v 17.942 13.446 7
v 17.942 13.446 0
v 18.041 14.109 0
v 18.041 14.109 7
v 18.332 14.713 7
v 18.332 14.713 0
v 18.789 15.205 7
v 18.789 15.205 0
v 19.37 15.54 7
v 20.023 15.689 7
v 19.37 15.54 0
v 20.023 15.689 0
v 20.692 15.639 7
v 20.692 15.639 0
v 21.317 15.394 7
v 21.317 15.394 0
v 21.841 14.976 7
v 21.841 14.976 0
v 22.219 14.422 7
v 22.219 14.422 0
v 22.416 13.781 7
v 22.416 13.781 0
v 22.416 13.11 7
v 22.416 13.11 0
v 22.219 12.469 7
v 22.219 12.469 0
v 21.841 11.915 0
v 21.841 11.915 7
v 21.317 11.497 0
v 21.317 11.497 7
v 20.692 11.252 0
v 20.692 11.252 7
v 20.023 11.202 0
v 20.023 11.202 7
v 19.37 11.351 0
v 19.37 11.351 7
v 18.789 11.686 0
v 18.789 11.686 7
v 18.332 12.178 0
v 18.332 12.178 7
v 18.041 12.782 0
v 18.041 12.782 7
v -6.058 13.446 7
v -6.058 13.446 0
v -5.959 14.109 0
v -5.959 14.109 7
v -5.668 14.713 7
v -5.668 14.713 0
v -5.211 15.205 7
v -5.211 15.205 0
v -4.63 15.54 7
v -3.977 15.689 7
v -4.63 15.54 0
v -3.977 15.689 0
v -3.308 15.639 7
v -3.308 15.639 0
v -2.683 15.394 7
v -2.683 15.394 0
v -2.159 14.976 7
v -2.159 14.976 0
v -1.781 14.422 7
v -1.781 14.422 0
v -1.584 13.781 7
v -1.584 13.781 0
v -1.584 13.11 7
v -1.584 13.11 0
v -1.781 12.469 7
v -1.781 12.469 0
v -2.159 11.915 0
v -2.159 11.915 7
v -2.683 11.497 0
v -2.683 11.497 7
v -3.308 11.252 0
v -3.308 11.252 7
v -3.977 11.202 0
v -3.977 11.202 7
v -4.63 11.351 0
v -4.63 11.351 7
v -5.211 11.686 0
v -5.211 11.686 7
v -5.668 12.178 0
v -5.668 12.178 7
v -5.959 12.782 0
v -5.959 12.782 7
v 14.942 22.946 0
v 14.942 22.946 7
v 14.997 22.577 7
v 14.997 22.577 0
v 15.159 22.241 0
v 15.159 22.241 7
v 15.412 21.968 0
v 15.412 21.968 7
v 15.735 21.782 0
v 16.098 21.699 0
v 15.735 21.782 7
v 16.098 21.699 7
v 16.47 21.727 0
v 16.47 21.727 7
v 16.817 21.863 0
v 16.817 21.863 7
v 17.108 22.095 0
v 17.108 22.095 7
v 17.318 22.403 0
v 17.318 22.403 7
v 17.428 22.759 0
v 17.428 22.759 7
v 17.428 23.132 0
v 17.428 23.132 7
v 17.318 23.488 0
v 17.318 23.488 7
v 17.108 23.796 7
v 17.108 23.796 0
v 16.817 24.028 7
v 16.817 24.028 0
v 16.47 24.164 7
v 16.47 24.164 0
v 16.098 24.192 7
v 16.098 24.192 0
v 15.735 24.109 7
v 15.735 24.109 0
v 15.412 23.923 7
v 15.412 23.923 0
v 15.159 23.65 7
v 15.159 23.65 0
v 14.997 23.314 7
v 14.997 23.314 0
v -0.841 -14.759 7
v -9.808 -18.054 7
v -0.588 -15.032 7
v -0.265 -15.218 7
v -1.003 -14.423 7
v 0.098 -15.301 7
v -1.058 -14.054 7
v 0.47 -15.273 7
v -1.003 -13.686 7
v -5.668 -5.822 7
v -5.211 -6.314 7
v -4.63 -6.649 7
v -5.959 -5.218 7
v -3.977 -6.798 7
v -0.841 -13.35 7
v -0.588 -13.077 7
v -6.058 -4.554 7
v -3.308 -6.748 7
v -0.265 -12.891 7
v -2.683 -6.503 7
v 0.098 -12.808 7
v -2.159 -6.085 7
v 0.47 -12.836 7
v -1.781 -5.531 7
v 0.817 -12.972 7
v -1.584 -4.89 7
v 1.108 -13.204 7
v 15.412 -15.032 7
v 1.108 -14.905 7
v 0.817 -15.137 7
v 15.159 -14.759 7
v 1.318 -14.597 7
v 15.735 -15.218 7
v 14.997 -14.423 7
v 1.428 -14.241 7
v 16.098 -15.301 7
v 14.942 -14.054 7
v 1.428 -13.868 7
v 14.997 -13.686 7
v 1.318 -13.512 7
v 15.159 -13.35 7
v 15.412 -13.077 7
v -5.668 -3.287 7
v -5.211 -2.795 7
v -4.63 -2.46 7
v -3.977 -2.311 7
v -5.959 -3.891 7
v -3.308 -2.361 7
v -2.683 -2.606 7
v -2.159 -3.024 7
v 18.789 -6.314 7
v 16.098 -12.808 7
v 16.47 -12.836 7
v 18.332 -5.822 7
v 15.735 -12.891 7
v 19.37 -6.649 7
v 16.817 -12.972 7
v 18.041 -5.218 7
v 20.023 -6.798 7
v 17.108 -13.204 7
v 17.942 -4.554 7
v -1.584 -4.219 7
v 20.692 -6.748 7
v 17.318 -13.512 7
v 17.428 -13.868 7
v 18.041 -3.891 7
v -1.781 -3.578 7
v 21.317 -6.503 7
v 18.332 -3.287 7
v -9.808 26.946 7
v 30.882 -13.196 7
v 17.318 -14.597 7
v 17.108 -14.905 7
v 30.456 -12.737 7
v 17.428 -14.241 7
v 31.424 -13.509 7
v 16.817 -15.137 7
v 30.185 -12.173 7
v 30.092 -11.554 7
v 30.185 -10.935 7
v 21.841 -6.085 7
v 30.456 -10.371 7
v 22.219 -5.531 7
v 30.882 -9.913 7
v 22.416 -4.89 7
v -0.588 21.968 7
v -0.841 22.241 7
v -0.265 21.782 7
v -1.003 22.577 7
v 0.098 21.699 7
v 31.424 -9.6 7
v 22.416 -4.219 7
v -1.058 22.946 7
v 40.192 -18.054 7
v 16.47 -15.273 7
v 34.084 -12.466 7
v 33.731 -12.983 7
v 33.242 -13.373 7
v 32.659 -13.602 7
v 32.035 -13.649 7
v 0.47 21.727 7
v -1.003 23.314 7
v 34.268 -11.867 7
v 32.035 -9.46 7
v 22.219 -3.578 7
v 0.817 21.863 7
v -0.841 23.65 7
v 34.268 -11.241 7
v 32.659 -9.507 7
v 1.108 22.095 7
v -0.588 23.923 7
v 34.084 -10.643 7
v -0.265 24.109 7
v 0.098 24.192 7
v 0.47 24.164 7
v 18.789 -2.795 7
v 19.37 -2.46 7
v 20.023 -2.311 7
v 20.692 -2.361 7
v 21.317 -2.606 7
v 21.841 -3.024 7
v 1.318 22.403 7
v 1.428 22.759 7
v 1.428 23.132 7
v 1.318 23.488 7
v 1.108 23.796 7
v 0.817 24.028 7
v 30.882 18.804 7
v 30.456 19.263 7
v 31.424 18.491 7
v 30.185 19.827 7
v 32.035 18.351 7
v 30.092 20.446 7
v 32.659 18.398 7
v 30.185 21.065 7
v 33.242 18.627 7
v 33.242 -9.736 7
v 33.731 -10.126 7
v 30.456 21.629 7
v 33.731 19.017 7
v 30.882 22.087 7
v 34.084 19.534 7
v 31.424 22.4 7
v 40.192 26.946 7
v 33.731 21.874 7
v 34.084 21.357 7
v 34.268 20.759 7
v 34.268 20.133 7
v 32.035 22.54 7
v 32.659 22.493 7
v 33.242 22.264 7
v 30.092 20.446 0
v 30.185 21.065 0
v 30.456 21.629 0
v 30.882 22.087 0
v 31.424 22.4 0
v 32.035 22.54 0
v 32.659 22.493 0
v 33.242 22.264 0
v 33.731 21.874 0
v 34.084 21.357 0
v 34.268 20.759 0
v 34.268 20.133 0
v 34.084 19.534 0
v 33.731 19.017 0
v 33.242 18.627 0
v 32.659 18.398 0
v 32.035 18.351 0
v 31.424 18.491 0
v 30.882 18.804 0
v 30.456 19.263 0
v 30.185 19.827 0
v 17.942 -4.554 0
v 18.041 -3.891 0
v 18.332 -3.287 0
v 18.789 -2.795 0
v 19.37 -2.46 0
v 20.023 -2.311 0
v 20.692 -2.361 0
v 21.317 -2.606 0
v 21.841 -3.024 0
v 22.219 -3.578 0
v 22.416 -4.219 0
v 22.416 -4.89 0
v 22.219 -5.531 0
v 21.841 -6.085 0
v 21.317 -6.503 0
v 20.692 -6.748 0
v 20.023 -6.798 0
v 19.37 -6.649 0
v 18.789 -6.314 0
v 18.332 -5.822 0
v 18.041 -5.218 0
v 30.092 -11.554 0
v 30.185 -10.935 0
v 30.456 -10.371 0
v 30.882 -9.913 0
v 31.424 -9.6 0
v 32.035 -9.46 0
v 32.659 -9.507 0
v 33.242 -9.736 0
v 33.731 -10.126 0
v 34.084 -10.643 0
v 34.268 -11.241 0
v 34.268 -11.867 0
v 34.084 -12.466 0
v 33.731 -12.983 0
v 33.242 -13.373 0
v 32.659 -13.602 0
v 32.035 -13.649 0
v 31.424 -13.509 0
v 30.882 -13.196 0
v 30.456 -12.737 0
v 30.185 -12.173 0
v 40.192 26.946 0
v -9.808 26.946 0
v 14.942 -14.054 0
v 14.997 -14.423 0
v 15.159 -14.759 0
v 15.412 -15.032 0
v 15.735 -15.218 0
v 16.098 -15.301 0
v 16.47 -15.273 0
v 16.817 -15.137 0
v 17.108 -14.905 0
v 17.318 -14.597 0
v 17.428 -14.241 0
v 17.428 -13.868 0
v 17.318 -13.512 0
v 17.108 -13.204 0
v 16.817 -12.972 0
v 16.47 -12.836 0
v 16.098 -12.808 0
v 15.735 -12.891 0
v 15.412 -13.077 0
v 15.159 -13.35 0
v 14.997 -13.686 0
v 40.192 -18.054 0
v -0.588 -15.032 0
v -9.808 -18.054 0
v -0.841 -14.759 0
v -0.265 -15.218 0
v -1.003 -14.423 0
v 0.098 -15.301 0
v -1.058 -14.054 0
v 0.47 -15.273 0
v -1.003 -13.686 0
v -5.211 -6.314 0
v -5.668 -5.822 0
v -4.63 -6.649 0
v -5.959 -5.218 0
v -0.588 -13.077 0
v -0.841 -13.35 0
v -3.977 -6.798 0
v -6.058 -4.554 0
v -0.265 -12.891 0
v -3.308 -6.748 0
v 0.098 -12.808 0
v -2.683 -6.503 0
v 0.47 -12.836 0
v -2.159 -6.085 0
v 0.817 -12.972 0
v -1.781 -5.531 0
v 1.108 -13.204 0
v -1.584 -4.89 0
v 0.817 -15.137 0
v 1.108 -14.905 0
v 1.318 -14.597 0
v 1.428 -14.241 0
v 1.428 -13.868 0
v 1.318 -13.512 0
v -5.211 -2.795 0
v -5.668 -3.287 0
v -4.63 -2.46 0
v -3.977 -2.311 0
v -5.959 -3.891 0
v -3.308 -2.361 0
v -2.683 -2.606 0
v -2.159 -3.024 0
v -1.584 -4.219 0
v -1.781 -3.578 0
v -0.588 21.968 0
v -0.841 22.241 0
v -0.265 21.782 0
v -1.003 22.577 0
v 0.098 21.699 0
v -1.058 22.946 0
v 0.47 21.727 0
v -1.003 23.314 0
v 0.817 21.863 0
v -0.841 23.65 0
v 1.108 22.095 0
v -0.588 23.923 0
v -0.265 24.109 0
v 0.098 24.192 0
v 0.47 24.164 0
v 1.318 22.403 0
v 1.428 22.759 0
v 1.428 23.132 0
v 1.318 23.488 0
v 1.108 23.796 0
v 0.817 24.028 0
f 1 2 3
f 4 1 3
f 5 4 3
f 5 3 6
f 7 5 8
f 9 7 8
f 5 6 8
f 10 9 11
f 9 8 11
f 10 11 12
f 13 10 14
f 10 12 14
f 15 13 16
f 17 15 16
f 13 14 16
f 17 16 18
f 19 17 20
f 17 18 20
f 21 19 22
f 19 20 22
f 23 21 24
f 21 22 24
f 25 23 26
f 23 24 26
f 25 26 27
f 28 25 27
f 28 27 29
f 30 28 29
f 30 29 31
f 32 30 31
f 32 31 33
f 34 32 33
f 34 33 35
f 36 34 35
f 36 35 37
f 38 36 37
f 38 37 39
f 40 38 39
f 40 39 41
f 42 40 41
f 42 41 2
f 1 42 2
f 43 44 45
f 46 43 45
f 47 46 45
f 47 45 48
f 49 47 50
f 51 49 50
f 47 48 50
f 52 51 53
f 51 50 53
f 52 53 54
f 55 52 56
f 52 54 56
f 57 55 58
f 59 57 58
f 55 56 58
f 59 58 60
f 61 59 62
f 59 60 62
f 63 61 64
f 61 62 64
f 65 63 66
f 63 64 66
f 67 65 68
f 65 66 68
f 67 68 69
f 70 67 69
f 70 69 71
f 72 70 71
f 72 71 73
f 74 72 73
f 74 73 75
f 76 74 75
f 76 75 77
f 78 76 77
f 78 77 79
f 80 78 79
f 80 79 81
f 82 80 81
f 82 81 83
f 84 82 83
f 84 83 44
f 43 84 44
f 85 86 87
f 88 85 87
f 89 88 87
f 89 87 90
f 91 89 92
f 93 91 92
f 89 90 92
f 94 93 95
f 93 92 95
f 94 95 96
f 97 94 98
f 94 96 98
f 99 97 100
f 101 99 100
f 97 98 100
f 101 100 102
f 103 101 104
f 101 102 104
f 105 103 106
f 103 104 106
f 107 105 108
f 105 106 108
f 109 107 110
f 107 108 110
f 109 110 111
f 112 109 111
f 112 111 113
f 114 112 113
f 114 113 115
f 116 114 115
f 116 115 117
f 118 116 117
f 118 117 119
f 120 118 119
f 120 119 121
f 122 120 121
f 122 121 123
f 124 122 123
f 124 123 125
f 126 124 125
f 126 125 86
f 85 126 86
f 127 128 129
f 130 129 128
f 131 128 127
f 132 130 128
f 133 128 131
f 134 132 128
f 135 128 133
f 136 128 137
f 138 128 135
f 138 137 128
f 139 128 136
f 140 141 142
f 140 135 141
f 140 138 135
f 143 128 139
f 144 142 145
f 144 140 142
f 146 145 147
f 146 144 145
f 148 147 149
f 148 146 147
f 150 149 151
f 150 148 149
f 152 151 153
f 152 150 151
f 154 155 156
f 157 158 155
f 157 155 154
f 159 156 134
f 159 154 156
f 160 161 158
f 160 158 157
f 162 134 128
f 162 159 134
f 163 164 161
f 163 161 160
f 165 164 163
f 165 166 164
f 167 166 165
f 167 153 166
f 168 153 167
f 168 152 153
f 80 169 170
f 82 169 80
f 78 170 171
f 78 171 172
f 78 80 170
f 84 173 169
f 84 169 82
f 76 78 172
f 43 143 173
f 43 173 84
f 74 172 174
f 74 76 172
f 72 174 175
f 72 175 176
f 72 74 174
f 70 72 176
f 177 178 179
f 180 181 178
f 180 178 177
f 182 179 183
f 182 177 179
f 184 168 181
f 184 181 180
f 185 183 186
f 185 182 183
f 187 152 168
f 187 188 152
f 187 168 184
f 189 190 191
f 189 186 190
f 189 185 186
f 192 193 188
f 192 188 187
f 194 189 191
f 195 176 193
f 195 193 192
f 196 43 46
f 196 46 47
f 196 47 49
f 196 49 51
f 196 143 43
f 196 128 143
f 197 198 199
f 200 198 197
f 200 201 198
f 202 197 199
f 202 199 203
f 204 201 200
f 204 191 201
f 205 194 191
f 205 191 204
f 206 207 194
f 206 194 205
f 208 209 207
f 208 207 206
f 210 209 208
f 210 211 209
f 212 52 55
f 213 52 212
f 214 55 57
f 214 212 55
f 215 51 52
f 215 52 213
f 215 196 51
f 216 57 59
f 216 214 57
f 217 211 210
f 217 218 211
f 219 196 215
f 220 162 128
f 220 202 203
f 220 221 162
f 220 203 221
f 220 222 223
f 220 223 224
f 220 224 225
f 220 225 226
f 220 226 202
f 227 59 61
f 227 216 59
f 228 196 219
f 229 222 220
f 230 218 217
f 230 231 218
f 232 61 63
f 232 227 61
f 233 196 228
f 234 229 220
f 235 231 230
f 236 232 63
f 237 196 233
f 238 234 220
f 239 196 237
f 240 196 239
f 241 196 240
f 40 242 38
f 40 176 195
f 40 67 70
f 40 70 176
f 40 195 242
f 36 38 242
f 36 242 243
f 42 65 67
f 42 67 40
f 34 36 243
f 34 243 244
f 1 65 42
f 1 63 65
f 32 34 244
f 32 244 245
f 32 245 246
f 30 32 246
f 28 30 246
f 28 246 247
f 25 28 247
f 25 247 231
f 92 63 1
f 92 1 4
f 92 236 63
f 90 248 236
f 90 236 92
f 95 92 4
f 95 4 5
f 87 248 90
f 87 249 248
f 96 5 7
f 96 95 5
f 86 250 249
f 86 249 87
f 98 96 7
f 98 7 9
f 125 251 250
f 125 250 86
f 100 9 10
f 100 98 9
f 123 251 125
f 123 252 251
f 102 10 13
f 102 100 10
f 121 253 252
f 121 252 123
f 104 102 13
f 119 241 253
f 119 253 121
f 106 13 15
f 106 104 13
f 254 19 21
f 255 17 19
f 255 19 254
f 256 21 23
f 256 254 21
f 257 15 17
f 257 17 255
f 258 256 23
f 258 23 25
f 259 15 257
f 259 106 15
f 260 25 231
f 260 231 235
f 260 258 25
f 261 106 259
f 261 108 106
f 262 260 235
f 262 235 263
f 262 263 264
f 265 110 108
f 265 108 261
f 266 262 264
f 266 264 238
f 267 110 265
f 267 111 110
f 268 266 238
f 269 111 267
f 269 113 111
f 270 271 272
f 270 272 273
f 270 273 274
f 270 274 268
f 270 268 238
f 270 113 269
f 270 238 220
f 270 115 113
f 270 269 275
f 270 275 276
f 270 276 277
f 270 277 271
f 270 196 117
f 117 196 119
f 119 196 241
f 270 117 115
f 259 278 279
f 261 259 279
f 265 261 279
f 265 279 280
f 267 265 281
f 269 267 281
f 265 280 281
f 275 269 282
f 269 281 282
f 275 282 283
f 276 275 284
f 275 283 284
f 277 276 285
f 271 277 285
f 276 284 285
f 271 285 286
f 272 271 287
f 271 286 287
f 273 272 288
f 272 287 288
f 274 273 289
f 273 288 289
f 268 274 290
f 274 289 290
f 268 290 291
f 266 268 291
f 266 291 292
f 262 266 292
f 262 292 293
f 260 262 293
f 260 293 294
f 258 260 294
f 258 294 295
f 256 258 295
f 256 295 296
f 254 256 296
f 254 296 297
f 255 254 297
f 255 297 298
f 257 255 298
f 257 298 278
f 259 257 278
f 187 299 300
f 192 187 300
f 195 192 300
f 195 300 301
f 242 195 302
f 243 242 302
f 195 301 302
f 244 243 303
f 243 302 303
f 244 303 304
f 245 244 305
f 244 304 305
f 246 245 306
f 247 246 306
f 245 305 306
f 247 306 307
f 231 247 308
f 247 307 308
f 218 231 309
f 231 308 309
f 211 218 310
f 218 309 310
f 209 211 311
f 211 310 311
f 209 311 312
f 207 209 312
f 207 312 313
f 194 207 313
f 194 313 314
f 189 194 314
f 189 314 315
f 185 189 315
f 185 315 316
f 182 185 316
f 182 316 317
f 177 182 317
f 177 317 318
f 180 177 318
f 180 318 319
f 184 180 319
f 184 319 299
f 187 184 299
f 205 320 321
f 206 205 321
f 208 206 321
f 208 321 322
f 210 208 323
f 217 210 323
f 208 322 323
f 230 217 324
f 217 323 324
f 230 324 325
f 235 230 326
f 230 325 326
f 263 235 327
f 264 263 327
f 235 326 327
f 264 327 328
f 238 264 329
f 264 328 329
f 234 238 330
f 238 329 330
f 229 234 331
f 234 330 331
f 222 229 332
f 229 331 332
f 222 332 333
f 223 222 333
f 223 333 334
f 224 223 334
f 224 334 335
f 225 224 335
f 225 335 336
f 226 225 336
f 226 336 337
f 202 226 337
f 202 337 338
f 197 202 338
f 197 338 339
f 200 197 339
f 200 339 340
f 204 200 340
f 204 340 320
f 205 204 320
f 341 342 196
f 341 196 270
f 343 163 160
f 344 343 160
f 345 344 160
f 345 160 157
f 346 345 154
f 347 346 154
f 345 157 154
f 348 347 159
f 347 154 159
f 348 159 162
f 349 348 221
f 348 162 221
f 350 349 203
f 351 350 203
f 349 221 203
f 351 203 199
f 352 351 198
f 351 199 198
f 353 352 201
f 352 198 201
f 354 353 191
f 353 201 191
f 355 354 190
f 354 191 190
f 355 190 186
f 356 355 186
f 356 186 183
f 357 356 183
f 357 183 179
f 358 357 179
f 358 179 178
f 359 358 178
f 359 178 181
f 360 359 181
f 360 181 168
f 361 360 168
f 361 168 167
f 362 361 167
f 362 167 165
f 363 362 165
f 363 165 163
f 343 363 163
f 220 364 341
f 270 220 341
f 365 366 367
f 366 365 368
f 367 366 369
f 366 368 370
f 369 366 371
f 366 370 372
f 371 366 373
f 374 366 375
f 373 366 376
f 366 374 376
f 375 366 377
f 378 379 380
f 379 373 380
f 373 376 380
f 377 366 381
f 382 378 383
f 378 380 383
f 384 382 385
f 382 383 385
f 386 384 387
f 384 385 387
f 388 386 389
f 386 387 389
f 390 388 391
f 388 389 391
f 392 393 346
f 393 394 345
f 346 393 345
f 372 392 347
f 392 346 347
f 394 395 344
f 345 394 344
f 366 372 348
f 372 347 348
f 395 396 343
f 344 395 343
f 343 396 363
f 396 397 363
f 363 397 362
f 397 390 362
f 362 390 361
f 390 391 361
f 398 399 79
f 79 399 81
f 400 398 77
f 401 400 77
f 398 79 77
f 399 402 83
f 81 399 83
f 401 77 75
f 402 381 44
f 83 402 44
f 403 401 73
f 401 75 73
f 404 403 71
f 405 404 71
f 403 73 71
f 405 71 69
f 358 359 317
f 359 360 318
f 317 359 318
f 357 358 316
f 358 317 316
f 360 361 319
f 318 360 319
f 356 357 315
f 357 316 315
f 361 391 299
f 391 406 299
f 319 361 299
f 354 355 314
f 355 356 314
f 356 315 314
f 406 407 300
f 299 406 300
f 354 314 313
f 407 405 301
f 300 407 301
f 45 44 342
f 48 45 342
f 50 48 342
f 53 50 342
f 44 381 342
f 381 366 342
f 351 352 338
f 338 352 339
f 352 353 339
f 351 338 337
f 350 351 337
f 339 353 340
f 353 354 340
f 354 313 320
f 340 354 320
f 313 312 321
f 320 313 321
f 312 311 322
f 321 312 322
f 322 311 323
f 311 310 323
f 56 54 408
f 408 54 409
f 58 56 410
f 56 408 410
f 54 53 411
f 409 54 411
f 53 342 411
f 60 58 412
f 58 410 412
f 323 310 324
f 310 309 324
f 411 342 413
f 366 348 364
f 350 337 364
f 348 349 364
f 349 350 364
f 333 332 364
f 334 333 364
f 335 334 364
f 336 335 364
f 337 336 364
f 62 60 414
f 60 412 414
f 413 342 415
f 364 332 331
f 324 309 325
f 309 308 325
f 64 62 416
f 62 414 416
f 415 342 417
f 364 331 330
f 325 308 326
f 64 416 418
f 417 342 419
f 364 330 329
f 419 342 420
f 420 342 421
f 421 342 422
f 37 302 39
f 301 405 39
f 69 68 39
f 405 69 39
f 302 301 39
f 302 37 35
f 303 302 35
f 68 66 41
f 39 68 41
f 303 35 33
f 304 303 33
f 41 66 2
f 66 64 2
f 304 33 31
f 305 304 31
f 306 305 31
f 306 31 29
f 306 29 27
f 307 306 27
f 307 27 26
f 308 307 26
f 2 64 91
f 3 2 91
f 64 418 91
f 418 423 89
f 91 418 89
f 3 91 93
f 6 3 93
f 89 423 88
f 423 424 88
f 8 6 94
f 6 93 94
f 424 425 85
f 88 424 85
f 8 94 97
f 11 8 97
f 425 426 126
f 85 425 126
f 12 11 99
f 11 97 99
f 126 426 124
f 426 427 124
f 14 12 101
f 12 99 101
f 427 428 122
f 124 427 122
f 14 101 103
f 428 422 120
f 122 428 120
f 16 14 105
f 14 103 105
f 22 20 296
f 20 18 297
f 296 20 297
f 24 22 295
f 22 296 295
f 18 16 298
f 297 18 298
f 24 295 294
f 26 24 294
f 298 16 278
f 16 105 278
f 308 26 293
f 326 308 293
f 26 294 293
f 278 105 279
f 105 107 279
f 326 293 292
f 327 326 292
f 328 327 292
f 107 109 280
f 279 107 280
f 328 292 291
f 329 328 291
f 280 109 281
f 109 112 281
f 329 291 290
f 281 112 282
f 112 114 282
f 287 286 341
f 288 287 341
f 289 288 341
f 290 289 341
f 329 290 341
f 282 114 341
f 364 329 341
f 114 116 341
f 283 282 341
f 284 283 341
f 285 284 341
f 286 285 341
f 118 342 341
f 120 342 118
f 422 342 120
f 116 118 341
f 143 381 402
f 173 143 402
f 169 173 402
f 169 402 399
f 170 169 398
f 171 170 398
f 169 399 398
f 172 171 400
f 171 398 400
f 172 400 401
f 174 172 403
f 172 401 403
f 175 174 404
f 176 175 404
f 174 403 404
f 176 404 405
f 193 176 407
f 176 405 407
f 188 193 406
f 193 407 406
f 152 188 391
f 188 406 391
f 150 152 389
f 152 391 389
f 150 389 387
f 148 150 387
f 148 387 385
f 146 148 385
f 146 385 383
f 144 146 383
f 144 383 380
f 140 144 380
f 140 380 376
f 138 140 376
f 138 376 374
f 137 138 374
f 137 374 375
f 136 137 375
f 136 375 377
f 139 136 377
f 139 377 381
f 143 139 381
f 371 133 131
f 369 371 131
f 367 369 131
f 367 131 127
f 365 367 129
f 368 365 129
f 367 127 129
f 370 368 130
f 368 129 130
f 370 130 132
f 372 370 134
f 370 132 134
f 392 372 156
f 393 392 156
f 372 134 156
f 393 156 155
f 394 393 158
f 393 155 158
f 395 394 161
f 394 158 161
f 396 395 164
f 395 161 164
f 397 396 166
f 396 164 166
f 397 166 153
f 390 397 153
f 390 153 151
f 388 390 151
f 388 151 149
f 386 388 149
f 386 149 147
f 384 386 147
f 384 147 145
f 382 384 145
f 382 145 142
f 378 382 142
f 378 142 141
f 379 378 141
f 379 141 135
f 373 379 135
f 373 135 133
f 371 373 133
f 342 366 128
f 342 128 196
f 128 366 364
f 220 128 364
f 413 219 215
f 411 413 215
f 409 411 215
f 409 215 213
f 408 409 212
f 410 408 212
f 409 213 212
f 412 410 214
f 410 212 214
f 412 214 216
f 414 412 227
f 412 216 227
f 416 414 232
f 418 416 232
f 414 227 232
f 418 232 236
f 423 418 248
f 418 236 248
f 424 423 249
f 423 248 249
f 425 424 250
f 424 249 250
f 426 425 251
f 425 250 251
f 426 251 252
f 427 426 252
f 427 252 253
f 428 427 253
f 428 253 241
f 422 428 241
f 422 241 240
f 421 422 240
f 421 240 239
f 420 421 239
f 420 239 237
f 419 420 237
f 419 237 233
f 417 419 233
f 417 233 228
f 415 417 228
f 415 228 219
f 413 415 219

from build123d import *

# Parameters (mm, degrees)
F0_W     = 50
F0_H     = 45
F1_DEPTH = 7
F3_D     = 4.2
F5_D     = 4.5
F7_D     = 2.5


with BuildPart() as f1:
    # F0 (on Top) → F1 (new body)
    with BuildSketch(Plane.XY):
        with Locations((15.1915311813, 4.4455631077)):
            Rectangle(F0_W, F0_H)
    extrude(amount=F1_DEPTH)

    # F3 (through all)
    with Locations(Plane.XY.offset(7)):
        with Locations((32.1915311813, 20.4455631077), (32.1915311813, -11.5544368923)):
            Hole(F3_D / 2)

    # F5 (through all)
    with Locations(Plane.XY.offset(7)):
        with Locations((-3.8084688187, 13.4455631077), (20.1915311813, 13.4455631077), (20.1915311813, -4.5544368923), (-3.8084688187, -4.5544368923)):
            Hole(F5_D / 2)

    # F7 (through all)
    with Locations(Plane(origin=(0, 0, 0), x_dir=(1, 0, 0), z_dir=(0, 0, -1))):
        with Locations((0.1915311813, 14.0544368923), (16.1915311813, 14.0544368923), (16.1915311813, -22.9455631077), (0.1915311813, -22.9455631077)):
            Hole(F7_D / 2)


solid = f1.part
